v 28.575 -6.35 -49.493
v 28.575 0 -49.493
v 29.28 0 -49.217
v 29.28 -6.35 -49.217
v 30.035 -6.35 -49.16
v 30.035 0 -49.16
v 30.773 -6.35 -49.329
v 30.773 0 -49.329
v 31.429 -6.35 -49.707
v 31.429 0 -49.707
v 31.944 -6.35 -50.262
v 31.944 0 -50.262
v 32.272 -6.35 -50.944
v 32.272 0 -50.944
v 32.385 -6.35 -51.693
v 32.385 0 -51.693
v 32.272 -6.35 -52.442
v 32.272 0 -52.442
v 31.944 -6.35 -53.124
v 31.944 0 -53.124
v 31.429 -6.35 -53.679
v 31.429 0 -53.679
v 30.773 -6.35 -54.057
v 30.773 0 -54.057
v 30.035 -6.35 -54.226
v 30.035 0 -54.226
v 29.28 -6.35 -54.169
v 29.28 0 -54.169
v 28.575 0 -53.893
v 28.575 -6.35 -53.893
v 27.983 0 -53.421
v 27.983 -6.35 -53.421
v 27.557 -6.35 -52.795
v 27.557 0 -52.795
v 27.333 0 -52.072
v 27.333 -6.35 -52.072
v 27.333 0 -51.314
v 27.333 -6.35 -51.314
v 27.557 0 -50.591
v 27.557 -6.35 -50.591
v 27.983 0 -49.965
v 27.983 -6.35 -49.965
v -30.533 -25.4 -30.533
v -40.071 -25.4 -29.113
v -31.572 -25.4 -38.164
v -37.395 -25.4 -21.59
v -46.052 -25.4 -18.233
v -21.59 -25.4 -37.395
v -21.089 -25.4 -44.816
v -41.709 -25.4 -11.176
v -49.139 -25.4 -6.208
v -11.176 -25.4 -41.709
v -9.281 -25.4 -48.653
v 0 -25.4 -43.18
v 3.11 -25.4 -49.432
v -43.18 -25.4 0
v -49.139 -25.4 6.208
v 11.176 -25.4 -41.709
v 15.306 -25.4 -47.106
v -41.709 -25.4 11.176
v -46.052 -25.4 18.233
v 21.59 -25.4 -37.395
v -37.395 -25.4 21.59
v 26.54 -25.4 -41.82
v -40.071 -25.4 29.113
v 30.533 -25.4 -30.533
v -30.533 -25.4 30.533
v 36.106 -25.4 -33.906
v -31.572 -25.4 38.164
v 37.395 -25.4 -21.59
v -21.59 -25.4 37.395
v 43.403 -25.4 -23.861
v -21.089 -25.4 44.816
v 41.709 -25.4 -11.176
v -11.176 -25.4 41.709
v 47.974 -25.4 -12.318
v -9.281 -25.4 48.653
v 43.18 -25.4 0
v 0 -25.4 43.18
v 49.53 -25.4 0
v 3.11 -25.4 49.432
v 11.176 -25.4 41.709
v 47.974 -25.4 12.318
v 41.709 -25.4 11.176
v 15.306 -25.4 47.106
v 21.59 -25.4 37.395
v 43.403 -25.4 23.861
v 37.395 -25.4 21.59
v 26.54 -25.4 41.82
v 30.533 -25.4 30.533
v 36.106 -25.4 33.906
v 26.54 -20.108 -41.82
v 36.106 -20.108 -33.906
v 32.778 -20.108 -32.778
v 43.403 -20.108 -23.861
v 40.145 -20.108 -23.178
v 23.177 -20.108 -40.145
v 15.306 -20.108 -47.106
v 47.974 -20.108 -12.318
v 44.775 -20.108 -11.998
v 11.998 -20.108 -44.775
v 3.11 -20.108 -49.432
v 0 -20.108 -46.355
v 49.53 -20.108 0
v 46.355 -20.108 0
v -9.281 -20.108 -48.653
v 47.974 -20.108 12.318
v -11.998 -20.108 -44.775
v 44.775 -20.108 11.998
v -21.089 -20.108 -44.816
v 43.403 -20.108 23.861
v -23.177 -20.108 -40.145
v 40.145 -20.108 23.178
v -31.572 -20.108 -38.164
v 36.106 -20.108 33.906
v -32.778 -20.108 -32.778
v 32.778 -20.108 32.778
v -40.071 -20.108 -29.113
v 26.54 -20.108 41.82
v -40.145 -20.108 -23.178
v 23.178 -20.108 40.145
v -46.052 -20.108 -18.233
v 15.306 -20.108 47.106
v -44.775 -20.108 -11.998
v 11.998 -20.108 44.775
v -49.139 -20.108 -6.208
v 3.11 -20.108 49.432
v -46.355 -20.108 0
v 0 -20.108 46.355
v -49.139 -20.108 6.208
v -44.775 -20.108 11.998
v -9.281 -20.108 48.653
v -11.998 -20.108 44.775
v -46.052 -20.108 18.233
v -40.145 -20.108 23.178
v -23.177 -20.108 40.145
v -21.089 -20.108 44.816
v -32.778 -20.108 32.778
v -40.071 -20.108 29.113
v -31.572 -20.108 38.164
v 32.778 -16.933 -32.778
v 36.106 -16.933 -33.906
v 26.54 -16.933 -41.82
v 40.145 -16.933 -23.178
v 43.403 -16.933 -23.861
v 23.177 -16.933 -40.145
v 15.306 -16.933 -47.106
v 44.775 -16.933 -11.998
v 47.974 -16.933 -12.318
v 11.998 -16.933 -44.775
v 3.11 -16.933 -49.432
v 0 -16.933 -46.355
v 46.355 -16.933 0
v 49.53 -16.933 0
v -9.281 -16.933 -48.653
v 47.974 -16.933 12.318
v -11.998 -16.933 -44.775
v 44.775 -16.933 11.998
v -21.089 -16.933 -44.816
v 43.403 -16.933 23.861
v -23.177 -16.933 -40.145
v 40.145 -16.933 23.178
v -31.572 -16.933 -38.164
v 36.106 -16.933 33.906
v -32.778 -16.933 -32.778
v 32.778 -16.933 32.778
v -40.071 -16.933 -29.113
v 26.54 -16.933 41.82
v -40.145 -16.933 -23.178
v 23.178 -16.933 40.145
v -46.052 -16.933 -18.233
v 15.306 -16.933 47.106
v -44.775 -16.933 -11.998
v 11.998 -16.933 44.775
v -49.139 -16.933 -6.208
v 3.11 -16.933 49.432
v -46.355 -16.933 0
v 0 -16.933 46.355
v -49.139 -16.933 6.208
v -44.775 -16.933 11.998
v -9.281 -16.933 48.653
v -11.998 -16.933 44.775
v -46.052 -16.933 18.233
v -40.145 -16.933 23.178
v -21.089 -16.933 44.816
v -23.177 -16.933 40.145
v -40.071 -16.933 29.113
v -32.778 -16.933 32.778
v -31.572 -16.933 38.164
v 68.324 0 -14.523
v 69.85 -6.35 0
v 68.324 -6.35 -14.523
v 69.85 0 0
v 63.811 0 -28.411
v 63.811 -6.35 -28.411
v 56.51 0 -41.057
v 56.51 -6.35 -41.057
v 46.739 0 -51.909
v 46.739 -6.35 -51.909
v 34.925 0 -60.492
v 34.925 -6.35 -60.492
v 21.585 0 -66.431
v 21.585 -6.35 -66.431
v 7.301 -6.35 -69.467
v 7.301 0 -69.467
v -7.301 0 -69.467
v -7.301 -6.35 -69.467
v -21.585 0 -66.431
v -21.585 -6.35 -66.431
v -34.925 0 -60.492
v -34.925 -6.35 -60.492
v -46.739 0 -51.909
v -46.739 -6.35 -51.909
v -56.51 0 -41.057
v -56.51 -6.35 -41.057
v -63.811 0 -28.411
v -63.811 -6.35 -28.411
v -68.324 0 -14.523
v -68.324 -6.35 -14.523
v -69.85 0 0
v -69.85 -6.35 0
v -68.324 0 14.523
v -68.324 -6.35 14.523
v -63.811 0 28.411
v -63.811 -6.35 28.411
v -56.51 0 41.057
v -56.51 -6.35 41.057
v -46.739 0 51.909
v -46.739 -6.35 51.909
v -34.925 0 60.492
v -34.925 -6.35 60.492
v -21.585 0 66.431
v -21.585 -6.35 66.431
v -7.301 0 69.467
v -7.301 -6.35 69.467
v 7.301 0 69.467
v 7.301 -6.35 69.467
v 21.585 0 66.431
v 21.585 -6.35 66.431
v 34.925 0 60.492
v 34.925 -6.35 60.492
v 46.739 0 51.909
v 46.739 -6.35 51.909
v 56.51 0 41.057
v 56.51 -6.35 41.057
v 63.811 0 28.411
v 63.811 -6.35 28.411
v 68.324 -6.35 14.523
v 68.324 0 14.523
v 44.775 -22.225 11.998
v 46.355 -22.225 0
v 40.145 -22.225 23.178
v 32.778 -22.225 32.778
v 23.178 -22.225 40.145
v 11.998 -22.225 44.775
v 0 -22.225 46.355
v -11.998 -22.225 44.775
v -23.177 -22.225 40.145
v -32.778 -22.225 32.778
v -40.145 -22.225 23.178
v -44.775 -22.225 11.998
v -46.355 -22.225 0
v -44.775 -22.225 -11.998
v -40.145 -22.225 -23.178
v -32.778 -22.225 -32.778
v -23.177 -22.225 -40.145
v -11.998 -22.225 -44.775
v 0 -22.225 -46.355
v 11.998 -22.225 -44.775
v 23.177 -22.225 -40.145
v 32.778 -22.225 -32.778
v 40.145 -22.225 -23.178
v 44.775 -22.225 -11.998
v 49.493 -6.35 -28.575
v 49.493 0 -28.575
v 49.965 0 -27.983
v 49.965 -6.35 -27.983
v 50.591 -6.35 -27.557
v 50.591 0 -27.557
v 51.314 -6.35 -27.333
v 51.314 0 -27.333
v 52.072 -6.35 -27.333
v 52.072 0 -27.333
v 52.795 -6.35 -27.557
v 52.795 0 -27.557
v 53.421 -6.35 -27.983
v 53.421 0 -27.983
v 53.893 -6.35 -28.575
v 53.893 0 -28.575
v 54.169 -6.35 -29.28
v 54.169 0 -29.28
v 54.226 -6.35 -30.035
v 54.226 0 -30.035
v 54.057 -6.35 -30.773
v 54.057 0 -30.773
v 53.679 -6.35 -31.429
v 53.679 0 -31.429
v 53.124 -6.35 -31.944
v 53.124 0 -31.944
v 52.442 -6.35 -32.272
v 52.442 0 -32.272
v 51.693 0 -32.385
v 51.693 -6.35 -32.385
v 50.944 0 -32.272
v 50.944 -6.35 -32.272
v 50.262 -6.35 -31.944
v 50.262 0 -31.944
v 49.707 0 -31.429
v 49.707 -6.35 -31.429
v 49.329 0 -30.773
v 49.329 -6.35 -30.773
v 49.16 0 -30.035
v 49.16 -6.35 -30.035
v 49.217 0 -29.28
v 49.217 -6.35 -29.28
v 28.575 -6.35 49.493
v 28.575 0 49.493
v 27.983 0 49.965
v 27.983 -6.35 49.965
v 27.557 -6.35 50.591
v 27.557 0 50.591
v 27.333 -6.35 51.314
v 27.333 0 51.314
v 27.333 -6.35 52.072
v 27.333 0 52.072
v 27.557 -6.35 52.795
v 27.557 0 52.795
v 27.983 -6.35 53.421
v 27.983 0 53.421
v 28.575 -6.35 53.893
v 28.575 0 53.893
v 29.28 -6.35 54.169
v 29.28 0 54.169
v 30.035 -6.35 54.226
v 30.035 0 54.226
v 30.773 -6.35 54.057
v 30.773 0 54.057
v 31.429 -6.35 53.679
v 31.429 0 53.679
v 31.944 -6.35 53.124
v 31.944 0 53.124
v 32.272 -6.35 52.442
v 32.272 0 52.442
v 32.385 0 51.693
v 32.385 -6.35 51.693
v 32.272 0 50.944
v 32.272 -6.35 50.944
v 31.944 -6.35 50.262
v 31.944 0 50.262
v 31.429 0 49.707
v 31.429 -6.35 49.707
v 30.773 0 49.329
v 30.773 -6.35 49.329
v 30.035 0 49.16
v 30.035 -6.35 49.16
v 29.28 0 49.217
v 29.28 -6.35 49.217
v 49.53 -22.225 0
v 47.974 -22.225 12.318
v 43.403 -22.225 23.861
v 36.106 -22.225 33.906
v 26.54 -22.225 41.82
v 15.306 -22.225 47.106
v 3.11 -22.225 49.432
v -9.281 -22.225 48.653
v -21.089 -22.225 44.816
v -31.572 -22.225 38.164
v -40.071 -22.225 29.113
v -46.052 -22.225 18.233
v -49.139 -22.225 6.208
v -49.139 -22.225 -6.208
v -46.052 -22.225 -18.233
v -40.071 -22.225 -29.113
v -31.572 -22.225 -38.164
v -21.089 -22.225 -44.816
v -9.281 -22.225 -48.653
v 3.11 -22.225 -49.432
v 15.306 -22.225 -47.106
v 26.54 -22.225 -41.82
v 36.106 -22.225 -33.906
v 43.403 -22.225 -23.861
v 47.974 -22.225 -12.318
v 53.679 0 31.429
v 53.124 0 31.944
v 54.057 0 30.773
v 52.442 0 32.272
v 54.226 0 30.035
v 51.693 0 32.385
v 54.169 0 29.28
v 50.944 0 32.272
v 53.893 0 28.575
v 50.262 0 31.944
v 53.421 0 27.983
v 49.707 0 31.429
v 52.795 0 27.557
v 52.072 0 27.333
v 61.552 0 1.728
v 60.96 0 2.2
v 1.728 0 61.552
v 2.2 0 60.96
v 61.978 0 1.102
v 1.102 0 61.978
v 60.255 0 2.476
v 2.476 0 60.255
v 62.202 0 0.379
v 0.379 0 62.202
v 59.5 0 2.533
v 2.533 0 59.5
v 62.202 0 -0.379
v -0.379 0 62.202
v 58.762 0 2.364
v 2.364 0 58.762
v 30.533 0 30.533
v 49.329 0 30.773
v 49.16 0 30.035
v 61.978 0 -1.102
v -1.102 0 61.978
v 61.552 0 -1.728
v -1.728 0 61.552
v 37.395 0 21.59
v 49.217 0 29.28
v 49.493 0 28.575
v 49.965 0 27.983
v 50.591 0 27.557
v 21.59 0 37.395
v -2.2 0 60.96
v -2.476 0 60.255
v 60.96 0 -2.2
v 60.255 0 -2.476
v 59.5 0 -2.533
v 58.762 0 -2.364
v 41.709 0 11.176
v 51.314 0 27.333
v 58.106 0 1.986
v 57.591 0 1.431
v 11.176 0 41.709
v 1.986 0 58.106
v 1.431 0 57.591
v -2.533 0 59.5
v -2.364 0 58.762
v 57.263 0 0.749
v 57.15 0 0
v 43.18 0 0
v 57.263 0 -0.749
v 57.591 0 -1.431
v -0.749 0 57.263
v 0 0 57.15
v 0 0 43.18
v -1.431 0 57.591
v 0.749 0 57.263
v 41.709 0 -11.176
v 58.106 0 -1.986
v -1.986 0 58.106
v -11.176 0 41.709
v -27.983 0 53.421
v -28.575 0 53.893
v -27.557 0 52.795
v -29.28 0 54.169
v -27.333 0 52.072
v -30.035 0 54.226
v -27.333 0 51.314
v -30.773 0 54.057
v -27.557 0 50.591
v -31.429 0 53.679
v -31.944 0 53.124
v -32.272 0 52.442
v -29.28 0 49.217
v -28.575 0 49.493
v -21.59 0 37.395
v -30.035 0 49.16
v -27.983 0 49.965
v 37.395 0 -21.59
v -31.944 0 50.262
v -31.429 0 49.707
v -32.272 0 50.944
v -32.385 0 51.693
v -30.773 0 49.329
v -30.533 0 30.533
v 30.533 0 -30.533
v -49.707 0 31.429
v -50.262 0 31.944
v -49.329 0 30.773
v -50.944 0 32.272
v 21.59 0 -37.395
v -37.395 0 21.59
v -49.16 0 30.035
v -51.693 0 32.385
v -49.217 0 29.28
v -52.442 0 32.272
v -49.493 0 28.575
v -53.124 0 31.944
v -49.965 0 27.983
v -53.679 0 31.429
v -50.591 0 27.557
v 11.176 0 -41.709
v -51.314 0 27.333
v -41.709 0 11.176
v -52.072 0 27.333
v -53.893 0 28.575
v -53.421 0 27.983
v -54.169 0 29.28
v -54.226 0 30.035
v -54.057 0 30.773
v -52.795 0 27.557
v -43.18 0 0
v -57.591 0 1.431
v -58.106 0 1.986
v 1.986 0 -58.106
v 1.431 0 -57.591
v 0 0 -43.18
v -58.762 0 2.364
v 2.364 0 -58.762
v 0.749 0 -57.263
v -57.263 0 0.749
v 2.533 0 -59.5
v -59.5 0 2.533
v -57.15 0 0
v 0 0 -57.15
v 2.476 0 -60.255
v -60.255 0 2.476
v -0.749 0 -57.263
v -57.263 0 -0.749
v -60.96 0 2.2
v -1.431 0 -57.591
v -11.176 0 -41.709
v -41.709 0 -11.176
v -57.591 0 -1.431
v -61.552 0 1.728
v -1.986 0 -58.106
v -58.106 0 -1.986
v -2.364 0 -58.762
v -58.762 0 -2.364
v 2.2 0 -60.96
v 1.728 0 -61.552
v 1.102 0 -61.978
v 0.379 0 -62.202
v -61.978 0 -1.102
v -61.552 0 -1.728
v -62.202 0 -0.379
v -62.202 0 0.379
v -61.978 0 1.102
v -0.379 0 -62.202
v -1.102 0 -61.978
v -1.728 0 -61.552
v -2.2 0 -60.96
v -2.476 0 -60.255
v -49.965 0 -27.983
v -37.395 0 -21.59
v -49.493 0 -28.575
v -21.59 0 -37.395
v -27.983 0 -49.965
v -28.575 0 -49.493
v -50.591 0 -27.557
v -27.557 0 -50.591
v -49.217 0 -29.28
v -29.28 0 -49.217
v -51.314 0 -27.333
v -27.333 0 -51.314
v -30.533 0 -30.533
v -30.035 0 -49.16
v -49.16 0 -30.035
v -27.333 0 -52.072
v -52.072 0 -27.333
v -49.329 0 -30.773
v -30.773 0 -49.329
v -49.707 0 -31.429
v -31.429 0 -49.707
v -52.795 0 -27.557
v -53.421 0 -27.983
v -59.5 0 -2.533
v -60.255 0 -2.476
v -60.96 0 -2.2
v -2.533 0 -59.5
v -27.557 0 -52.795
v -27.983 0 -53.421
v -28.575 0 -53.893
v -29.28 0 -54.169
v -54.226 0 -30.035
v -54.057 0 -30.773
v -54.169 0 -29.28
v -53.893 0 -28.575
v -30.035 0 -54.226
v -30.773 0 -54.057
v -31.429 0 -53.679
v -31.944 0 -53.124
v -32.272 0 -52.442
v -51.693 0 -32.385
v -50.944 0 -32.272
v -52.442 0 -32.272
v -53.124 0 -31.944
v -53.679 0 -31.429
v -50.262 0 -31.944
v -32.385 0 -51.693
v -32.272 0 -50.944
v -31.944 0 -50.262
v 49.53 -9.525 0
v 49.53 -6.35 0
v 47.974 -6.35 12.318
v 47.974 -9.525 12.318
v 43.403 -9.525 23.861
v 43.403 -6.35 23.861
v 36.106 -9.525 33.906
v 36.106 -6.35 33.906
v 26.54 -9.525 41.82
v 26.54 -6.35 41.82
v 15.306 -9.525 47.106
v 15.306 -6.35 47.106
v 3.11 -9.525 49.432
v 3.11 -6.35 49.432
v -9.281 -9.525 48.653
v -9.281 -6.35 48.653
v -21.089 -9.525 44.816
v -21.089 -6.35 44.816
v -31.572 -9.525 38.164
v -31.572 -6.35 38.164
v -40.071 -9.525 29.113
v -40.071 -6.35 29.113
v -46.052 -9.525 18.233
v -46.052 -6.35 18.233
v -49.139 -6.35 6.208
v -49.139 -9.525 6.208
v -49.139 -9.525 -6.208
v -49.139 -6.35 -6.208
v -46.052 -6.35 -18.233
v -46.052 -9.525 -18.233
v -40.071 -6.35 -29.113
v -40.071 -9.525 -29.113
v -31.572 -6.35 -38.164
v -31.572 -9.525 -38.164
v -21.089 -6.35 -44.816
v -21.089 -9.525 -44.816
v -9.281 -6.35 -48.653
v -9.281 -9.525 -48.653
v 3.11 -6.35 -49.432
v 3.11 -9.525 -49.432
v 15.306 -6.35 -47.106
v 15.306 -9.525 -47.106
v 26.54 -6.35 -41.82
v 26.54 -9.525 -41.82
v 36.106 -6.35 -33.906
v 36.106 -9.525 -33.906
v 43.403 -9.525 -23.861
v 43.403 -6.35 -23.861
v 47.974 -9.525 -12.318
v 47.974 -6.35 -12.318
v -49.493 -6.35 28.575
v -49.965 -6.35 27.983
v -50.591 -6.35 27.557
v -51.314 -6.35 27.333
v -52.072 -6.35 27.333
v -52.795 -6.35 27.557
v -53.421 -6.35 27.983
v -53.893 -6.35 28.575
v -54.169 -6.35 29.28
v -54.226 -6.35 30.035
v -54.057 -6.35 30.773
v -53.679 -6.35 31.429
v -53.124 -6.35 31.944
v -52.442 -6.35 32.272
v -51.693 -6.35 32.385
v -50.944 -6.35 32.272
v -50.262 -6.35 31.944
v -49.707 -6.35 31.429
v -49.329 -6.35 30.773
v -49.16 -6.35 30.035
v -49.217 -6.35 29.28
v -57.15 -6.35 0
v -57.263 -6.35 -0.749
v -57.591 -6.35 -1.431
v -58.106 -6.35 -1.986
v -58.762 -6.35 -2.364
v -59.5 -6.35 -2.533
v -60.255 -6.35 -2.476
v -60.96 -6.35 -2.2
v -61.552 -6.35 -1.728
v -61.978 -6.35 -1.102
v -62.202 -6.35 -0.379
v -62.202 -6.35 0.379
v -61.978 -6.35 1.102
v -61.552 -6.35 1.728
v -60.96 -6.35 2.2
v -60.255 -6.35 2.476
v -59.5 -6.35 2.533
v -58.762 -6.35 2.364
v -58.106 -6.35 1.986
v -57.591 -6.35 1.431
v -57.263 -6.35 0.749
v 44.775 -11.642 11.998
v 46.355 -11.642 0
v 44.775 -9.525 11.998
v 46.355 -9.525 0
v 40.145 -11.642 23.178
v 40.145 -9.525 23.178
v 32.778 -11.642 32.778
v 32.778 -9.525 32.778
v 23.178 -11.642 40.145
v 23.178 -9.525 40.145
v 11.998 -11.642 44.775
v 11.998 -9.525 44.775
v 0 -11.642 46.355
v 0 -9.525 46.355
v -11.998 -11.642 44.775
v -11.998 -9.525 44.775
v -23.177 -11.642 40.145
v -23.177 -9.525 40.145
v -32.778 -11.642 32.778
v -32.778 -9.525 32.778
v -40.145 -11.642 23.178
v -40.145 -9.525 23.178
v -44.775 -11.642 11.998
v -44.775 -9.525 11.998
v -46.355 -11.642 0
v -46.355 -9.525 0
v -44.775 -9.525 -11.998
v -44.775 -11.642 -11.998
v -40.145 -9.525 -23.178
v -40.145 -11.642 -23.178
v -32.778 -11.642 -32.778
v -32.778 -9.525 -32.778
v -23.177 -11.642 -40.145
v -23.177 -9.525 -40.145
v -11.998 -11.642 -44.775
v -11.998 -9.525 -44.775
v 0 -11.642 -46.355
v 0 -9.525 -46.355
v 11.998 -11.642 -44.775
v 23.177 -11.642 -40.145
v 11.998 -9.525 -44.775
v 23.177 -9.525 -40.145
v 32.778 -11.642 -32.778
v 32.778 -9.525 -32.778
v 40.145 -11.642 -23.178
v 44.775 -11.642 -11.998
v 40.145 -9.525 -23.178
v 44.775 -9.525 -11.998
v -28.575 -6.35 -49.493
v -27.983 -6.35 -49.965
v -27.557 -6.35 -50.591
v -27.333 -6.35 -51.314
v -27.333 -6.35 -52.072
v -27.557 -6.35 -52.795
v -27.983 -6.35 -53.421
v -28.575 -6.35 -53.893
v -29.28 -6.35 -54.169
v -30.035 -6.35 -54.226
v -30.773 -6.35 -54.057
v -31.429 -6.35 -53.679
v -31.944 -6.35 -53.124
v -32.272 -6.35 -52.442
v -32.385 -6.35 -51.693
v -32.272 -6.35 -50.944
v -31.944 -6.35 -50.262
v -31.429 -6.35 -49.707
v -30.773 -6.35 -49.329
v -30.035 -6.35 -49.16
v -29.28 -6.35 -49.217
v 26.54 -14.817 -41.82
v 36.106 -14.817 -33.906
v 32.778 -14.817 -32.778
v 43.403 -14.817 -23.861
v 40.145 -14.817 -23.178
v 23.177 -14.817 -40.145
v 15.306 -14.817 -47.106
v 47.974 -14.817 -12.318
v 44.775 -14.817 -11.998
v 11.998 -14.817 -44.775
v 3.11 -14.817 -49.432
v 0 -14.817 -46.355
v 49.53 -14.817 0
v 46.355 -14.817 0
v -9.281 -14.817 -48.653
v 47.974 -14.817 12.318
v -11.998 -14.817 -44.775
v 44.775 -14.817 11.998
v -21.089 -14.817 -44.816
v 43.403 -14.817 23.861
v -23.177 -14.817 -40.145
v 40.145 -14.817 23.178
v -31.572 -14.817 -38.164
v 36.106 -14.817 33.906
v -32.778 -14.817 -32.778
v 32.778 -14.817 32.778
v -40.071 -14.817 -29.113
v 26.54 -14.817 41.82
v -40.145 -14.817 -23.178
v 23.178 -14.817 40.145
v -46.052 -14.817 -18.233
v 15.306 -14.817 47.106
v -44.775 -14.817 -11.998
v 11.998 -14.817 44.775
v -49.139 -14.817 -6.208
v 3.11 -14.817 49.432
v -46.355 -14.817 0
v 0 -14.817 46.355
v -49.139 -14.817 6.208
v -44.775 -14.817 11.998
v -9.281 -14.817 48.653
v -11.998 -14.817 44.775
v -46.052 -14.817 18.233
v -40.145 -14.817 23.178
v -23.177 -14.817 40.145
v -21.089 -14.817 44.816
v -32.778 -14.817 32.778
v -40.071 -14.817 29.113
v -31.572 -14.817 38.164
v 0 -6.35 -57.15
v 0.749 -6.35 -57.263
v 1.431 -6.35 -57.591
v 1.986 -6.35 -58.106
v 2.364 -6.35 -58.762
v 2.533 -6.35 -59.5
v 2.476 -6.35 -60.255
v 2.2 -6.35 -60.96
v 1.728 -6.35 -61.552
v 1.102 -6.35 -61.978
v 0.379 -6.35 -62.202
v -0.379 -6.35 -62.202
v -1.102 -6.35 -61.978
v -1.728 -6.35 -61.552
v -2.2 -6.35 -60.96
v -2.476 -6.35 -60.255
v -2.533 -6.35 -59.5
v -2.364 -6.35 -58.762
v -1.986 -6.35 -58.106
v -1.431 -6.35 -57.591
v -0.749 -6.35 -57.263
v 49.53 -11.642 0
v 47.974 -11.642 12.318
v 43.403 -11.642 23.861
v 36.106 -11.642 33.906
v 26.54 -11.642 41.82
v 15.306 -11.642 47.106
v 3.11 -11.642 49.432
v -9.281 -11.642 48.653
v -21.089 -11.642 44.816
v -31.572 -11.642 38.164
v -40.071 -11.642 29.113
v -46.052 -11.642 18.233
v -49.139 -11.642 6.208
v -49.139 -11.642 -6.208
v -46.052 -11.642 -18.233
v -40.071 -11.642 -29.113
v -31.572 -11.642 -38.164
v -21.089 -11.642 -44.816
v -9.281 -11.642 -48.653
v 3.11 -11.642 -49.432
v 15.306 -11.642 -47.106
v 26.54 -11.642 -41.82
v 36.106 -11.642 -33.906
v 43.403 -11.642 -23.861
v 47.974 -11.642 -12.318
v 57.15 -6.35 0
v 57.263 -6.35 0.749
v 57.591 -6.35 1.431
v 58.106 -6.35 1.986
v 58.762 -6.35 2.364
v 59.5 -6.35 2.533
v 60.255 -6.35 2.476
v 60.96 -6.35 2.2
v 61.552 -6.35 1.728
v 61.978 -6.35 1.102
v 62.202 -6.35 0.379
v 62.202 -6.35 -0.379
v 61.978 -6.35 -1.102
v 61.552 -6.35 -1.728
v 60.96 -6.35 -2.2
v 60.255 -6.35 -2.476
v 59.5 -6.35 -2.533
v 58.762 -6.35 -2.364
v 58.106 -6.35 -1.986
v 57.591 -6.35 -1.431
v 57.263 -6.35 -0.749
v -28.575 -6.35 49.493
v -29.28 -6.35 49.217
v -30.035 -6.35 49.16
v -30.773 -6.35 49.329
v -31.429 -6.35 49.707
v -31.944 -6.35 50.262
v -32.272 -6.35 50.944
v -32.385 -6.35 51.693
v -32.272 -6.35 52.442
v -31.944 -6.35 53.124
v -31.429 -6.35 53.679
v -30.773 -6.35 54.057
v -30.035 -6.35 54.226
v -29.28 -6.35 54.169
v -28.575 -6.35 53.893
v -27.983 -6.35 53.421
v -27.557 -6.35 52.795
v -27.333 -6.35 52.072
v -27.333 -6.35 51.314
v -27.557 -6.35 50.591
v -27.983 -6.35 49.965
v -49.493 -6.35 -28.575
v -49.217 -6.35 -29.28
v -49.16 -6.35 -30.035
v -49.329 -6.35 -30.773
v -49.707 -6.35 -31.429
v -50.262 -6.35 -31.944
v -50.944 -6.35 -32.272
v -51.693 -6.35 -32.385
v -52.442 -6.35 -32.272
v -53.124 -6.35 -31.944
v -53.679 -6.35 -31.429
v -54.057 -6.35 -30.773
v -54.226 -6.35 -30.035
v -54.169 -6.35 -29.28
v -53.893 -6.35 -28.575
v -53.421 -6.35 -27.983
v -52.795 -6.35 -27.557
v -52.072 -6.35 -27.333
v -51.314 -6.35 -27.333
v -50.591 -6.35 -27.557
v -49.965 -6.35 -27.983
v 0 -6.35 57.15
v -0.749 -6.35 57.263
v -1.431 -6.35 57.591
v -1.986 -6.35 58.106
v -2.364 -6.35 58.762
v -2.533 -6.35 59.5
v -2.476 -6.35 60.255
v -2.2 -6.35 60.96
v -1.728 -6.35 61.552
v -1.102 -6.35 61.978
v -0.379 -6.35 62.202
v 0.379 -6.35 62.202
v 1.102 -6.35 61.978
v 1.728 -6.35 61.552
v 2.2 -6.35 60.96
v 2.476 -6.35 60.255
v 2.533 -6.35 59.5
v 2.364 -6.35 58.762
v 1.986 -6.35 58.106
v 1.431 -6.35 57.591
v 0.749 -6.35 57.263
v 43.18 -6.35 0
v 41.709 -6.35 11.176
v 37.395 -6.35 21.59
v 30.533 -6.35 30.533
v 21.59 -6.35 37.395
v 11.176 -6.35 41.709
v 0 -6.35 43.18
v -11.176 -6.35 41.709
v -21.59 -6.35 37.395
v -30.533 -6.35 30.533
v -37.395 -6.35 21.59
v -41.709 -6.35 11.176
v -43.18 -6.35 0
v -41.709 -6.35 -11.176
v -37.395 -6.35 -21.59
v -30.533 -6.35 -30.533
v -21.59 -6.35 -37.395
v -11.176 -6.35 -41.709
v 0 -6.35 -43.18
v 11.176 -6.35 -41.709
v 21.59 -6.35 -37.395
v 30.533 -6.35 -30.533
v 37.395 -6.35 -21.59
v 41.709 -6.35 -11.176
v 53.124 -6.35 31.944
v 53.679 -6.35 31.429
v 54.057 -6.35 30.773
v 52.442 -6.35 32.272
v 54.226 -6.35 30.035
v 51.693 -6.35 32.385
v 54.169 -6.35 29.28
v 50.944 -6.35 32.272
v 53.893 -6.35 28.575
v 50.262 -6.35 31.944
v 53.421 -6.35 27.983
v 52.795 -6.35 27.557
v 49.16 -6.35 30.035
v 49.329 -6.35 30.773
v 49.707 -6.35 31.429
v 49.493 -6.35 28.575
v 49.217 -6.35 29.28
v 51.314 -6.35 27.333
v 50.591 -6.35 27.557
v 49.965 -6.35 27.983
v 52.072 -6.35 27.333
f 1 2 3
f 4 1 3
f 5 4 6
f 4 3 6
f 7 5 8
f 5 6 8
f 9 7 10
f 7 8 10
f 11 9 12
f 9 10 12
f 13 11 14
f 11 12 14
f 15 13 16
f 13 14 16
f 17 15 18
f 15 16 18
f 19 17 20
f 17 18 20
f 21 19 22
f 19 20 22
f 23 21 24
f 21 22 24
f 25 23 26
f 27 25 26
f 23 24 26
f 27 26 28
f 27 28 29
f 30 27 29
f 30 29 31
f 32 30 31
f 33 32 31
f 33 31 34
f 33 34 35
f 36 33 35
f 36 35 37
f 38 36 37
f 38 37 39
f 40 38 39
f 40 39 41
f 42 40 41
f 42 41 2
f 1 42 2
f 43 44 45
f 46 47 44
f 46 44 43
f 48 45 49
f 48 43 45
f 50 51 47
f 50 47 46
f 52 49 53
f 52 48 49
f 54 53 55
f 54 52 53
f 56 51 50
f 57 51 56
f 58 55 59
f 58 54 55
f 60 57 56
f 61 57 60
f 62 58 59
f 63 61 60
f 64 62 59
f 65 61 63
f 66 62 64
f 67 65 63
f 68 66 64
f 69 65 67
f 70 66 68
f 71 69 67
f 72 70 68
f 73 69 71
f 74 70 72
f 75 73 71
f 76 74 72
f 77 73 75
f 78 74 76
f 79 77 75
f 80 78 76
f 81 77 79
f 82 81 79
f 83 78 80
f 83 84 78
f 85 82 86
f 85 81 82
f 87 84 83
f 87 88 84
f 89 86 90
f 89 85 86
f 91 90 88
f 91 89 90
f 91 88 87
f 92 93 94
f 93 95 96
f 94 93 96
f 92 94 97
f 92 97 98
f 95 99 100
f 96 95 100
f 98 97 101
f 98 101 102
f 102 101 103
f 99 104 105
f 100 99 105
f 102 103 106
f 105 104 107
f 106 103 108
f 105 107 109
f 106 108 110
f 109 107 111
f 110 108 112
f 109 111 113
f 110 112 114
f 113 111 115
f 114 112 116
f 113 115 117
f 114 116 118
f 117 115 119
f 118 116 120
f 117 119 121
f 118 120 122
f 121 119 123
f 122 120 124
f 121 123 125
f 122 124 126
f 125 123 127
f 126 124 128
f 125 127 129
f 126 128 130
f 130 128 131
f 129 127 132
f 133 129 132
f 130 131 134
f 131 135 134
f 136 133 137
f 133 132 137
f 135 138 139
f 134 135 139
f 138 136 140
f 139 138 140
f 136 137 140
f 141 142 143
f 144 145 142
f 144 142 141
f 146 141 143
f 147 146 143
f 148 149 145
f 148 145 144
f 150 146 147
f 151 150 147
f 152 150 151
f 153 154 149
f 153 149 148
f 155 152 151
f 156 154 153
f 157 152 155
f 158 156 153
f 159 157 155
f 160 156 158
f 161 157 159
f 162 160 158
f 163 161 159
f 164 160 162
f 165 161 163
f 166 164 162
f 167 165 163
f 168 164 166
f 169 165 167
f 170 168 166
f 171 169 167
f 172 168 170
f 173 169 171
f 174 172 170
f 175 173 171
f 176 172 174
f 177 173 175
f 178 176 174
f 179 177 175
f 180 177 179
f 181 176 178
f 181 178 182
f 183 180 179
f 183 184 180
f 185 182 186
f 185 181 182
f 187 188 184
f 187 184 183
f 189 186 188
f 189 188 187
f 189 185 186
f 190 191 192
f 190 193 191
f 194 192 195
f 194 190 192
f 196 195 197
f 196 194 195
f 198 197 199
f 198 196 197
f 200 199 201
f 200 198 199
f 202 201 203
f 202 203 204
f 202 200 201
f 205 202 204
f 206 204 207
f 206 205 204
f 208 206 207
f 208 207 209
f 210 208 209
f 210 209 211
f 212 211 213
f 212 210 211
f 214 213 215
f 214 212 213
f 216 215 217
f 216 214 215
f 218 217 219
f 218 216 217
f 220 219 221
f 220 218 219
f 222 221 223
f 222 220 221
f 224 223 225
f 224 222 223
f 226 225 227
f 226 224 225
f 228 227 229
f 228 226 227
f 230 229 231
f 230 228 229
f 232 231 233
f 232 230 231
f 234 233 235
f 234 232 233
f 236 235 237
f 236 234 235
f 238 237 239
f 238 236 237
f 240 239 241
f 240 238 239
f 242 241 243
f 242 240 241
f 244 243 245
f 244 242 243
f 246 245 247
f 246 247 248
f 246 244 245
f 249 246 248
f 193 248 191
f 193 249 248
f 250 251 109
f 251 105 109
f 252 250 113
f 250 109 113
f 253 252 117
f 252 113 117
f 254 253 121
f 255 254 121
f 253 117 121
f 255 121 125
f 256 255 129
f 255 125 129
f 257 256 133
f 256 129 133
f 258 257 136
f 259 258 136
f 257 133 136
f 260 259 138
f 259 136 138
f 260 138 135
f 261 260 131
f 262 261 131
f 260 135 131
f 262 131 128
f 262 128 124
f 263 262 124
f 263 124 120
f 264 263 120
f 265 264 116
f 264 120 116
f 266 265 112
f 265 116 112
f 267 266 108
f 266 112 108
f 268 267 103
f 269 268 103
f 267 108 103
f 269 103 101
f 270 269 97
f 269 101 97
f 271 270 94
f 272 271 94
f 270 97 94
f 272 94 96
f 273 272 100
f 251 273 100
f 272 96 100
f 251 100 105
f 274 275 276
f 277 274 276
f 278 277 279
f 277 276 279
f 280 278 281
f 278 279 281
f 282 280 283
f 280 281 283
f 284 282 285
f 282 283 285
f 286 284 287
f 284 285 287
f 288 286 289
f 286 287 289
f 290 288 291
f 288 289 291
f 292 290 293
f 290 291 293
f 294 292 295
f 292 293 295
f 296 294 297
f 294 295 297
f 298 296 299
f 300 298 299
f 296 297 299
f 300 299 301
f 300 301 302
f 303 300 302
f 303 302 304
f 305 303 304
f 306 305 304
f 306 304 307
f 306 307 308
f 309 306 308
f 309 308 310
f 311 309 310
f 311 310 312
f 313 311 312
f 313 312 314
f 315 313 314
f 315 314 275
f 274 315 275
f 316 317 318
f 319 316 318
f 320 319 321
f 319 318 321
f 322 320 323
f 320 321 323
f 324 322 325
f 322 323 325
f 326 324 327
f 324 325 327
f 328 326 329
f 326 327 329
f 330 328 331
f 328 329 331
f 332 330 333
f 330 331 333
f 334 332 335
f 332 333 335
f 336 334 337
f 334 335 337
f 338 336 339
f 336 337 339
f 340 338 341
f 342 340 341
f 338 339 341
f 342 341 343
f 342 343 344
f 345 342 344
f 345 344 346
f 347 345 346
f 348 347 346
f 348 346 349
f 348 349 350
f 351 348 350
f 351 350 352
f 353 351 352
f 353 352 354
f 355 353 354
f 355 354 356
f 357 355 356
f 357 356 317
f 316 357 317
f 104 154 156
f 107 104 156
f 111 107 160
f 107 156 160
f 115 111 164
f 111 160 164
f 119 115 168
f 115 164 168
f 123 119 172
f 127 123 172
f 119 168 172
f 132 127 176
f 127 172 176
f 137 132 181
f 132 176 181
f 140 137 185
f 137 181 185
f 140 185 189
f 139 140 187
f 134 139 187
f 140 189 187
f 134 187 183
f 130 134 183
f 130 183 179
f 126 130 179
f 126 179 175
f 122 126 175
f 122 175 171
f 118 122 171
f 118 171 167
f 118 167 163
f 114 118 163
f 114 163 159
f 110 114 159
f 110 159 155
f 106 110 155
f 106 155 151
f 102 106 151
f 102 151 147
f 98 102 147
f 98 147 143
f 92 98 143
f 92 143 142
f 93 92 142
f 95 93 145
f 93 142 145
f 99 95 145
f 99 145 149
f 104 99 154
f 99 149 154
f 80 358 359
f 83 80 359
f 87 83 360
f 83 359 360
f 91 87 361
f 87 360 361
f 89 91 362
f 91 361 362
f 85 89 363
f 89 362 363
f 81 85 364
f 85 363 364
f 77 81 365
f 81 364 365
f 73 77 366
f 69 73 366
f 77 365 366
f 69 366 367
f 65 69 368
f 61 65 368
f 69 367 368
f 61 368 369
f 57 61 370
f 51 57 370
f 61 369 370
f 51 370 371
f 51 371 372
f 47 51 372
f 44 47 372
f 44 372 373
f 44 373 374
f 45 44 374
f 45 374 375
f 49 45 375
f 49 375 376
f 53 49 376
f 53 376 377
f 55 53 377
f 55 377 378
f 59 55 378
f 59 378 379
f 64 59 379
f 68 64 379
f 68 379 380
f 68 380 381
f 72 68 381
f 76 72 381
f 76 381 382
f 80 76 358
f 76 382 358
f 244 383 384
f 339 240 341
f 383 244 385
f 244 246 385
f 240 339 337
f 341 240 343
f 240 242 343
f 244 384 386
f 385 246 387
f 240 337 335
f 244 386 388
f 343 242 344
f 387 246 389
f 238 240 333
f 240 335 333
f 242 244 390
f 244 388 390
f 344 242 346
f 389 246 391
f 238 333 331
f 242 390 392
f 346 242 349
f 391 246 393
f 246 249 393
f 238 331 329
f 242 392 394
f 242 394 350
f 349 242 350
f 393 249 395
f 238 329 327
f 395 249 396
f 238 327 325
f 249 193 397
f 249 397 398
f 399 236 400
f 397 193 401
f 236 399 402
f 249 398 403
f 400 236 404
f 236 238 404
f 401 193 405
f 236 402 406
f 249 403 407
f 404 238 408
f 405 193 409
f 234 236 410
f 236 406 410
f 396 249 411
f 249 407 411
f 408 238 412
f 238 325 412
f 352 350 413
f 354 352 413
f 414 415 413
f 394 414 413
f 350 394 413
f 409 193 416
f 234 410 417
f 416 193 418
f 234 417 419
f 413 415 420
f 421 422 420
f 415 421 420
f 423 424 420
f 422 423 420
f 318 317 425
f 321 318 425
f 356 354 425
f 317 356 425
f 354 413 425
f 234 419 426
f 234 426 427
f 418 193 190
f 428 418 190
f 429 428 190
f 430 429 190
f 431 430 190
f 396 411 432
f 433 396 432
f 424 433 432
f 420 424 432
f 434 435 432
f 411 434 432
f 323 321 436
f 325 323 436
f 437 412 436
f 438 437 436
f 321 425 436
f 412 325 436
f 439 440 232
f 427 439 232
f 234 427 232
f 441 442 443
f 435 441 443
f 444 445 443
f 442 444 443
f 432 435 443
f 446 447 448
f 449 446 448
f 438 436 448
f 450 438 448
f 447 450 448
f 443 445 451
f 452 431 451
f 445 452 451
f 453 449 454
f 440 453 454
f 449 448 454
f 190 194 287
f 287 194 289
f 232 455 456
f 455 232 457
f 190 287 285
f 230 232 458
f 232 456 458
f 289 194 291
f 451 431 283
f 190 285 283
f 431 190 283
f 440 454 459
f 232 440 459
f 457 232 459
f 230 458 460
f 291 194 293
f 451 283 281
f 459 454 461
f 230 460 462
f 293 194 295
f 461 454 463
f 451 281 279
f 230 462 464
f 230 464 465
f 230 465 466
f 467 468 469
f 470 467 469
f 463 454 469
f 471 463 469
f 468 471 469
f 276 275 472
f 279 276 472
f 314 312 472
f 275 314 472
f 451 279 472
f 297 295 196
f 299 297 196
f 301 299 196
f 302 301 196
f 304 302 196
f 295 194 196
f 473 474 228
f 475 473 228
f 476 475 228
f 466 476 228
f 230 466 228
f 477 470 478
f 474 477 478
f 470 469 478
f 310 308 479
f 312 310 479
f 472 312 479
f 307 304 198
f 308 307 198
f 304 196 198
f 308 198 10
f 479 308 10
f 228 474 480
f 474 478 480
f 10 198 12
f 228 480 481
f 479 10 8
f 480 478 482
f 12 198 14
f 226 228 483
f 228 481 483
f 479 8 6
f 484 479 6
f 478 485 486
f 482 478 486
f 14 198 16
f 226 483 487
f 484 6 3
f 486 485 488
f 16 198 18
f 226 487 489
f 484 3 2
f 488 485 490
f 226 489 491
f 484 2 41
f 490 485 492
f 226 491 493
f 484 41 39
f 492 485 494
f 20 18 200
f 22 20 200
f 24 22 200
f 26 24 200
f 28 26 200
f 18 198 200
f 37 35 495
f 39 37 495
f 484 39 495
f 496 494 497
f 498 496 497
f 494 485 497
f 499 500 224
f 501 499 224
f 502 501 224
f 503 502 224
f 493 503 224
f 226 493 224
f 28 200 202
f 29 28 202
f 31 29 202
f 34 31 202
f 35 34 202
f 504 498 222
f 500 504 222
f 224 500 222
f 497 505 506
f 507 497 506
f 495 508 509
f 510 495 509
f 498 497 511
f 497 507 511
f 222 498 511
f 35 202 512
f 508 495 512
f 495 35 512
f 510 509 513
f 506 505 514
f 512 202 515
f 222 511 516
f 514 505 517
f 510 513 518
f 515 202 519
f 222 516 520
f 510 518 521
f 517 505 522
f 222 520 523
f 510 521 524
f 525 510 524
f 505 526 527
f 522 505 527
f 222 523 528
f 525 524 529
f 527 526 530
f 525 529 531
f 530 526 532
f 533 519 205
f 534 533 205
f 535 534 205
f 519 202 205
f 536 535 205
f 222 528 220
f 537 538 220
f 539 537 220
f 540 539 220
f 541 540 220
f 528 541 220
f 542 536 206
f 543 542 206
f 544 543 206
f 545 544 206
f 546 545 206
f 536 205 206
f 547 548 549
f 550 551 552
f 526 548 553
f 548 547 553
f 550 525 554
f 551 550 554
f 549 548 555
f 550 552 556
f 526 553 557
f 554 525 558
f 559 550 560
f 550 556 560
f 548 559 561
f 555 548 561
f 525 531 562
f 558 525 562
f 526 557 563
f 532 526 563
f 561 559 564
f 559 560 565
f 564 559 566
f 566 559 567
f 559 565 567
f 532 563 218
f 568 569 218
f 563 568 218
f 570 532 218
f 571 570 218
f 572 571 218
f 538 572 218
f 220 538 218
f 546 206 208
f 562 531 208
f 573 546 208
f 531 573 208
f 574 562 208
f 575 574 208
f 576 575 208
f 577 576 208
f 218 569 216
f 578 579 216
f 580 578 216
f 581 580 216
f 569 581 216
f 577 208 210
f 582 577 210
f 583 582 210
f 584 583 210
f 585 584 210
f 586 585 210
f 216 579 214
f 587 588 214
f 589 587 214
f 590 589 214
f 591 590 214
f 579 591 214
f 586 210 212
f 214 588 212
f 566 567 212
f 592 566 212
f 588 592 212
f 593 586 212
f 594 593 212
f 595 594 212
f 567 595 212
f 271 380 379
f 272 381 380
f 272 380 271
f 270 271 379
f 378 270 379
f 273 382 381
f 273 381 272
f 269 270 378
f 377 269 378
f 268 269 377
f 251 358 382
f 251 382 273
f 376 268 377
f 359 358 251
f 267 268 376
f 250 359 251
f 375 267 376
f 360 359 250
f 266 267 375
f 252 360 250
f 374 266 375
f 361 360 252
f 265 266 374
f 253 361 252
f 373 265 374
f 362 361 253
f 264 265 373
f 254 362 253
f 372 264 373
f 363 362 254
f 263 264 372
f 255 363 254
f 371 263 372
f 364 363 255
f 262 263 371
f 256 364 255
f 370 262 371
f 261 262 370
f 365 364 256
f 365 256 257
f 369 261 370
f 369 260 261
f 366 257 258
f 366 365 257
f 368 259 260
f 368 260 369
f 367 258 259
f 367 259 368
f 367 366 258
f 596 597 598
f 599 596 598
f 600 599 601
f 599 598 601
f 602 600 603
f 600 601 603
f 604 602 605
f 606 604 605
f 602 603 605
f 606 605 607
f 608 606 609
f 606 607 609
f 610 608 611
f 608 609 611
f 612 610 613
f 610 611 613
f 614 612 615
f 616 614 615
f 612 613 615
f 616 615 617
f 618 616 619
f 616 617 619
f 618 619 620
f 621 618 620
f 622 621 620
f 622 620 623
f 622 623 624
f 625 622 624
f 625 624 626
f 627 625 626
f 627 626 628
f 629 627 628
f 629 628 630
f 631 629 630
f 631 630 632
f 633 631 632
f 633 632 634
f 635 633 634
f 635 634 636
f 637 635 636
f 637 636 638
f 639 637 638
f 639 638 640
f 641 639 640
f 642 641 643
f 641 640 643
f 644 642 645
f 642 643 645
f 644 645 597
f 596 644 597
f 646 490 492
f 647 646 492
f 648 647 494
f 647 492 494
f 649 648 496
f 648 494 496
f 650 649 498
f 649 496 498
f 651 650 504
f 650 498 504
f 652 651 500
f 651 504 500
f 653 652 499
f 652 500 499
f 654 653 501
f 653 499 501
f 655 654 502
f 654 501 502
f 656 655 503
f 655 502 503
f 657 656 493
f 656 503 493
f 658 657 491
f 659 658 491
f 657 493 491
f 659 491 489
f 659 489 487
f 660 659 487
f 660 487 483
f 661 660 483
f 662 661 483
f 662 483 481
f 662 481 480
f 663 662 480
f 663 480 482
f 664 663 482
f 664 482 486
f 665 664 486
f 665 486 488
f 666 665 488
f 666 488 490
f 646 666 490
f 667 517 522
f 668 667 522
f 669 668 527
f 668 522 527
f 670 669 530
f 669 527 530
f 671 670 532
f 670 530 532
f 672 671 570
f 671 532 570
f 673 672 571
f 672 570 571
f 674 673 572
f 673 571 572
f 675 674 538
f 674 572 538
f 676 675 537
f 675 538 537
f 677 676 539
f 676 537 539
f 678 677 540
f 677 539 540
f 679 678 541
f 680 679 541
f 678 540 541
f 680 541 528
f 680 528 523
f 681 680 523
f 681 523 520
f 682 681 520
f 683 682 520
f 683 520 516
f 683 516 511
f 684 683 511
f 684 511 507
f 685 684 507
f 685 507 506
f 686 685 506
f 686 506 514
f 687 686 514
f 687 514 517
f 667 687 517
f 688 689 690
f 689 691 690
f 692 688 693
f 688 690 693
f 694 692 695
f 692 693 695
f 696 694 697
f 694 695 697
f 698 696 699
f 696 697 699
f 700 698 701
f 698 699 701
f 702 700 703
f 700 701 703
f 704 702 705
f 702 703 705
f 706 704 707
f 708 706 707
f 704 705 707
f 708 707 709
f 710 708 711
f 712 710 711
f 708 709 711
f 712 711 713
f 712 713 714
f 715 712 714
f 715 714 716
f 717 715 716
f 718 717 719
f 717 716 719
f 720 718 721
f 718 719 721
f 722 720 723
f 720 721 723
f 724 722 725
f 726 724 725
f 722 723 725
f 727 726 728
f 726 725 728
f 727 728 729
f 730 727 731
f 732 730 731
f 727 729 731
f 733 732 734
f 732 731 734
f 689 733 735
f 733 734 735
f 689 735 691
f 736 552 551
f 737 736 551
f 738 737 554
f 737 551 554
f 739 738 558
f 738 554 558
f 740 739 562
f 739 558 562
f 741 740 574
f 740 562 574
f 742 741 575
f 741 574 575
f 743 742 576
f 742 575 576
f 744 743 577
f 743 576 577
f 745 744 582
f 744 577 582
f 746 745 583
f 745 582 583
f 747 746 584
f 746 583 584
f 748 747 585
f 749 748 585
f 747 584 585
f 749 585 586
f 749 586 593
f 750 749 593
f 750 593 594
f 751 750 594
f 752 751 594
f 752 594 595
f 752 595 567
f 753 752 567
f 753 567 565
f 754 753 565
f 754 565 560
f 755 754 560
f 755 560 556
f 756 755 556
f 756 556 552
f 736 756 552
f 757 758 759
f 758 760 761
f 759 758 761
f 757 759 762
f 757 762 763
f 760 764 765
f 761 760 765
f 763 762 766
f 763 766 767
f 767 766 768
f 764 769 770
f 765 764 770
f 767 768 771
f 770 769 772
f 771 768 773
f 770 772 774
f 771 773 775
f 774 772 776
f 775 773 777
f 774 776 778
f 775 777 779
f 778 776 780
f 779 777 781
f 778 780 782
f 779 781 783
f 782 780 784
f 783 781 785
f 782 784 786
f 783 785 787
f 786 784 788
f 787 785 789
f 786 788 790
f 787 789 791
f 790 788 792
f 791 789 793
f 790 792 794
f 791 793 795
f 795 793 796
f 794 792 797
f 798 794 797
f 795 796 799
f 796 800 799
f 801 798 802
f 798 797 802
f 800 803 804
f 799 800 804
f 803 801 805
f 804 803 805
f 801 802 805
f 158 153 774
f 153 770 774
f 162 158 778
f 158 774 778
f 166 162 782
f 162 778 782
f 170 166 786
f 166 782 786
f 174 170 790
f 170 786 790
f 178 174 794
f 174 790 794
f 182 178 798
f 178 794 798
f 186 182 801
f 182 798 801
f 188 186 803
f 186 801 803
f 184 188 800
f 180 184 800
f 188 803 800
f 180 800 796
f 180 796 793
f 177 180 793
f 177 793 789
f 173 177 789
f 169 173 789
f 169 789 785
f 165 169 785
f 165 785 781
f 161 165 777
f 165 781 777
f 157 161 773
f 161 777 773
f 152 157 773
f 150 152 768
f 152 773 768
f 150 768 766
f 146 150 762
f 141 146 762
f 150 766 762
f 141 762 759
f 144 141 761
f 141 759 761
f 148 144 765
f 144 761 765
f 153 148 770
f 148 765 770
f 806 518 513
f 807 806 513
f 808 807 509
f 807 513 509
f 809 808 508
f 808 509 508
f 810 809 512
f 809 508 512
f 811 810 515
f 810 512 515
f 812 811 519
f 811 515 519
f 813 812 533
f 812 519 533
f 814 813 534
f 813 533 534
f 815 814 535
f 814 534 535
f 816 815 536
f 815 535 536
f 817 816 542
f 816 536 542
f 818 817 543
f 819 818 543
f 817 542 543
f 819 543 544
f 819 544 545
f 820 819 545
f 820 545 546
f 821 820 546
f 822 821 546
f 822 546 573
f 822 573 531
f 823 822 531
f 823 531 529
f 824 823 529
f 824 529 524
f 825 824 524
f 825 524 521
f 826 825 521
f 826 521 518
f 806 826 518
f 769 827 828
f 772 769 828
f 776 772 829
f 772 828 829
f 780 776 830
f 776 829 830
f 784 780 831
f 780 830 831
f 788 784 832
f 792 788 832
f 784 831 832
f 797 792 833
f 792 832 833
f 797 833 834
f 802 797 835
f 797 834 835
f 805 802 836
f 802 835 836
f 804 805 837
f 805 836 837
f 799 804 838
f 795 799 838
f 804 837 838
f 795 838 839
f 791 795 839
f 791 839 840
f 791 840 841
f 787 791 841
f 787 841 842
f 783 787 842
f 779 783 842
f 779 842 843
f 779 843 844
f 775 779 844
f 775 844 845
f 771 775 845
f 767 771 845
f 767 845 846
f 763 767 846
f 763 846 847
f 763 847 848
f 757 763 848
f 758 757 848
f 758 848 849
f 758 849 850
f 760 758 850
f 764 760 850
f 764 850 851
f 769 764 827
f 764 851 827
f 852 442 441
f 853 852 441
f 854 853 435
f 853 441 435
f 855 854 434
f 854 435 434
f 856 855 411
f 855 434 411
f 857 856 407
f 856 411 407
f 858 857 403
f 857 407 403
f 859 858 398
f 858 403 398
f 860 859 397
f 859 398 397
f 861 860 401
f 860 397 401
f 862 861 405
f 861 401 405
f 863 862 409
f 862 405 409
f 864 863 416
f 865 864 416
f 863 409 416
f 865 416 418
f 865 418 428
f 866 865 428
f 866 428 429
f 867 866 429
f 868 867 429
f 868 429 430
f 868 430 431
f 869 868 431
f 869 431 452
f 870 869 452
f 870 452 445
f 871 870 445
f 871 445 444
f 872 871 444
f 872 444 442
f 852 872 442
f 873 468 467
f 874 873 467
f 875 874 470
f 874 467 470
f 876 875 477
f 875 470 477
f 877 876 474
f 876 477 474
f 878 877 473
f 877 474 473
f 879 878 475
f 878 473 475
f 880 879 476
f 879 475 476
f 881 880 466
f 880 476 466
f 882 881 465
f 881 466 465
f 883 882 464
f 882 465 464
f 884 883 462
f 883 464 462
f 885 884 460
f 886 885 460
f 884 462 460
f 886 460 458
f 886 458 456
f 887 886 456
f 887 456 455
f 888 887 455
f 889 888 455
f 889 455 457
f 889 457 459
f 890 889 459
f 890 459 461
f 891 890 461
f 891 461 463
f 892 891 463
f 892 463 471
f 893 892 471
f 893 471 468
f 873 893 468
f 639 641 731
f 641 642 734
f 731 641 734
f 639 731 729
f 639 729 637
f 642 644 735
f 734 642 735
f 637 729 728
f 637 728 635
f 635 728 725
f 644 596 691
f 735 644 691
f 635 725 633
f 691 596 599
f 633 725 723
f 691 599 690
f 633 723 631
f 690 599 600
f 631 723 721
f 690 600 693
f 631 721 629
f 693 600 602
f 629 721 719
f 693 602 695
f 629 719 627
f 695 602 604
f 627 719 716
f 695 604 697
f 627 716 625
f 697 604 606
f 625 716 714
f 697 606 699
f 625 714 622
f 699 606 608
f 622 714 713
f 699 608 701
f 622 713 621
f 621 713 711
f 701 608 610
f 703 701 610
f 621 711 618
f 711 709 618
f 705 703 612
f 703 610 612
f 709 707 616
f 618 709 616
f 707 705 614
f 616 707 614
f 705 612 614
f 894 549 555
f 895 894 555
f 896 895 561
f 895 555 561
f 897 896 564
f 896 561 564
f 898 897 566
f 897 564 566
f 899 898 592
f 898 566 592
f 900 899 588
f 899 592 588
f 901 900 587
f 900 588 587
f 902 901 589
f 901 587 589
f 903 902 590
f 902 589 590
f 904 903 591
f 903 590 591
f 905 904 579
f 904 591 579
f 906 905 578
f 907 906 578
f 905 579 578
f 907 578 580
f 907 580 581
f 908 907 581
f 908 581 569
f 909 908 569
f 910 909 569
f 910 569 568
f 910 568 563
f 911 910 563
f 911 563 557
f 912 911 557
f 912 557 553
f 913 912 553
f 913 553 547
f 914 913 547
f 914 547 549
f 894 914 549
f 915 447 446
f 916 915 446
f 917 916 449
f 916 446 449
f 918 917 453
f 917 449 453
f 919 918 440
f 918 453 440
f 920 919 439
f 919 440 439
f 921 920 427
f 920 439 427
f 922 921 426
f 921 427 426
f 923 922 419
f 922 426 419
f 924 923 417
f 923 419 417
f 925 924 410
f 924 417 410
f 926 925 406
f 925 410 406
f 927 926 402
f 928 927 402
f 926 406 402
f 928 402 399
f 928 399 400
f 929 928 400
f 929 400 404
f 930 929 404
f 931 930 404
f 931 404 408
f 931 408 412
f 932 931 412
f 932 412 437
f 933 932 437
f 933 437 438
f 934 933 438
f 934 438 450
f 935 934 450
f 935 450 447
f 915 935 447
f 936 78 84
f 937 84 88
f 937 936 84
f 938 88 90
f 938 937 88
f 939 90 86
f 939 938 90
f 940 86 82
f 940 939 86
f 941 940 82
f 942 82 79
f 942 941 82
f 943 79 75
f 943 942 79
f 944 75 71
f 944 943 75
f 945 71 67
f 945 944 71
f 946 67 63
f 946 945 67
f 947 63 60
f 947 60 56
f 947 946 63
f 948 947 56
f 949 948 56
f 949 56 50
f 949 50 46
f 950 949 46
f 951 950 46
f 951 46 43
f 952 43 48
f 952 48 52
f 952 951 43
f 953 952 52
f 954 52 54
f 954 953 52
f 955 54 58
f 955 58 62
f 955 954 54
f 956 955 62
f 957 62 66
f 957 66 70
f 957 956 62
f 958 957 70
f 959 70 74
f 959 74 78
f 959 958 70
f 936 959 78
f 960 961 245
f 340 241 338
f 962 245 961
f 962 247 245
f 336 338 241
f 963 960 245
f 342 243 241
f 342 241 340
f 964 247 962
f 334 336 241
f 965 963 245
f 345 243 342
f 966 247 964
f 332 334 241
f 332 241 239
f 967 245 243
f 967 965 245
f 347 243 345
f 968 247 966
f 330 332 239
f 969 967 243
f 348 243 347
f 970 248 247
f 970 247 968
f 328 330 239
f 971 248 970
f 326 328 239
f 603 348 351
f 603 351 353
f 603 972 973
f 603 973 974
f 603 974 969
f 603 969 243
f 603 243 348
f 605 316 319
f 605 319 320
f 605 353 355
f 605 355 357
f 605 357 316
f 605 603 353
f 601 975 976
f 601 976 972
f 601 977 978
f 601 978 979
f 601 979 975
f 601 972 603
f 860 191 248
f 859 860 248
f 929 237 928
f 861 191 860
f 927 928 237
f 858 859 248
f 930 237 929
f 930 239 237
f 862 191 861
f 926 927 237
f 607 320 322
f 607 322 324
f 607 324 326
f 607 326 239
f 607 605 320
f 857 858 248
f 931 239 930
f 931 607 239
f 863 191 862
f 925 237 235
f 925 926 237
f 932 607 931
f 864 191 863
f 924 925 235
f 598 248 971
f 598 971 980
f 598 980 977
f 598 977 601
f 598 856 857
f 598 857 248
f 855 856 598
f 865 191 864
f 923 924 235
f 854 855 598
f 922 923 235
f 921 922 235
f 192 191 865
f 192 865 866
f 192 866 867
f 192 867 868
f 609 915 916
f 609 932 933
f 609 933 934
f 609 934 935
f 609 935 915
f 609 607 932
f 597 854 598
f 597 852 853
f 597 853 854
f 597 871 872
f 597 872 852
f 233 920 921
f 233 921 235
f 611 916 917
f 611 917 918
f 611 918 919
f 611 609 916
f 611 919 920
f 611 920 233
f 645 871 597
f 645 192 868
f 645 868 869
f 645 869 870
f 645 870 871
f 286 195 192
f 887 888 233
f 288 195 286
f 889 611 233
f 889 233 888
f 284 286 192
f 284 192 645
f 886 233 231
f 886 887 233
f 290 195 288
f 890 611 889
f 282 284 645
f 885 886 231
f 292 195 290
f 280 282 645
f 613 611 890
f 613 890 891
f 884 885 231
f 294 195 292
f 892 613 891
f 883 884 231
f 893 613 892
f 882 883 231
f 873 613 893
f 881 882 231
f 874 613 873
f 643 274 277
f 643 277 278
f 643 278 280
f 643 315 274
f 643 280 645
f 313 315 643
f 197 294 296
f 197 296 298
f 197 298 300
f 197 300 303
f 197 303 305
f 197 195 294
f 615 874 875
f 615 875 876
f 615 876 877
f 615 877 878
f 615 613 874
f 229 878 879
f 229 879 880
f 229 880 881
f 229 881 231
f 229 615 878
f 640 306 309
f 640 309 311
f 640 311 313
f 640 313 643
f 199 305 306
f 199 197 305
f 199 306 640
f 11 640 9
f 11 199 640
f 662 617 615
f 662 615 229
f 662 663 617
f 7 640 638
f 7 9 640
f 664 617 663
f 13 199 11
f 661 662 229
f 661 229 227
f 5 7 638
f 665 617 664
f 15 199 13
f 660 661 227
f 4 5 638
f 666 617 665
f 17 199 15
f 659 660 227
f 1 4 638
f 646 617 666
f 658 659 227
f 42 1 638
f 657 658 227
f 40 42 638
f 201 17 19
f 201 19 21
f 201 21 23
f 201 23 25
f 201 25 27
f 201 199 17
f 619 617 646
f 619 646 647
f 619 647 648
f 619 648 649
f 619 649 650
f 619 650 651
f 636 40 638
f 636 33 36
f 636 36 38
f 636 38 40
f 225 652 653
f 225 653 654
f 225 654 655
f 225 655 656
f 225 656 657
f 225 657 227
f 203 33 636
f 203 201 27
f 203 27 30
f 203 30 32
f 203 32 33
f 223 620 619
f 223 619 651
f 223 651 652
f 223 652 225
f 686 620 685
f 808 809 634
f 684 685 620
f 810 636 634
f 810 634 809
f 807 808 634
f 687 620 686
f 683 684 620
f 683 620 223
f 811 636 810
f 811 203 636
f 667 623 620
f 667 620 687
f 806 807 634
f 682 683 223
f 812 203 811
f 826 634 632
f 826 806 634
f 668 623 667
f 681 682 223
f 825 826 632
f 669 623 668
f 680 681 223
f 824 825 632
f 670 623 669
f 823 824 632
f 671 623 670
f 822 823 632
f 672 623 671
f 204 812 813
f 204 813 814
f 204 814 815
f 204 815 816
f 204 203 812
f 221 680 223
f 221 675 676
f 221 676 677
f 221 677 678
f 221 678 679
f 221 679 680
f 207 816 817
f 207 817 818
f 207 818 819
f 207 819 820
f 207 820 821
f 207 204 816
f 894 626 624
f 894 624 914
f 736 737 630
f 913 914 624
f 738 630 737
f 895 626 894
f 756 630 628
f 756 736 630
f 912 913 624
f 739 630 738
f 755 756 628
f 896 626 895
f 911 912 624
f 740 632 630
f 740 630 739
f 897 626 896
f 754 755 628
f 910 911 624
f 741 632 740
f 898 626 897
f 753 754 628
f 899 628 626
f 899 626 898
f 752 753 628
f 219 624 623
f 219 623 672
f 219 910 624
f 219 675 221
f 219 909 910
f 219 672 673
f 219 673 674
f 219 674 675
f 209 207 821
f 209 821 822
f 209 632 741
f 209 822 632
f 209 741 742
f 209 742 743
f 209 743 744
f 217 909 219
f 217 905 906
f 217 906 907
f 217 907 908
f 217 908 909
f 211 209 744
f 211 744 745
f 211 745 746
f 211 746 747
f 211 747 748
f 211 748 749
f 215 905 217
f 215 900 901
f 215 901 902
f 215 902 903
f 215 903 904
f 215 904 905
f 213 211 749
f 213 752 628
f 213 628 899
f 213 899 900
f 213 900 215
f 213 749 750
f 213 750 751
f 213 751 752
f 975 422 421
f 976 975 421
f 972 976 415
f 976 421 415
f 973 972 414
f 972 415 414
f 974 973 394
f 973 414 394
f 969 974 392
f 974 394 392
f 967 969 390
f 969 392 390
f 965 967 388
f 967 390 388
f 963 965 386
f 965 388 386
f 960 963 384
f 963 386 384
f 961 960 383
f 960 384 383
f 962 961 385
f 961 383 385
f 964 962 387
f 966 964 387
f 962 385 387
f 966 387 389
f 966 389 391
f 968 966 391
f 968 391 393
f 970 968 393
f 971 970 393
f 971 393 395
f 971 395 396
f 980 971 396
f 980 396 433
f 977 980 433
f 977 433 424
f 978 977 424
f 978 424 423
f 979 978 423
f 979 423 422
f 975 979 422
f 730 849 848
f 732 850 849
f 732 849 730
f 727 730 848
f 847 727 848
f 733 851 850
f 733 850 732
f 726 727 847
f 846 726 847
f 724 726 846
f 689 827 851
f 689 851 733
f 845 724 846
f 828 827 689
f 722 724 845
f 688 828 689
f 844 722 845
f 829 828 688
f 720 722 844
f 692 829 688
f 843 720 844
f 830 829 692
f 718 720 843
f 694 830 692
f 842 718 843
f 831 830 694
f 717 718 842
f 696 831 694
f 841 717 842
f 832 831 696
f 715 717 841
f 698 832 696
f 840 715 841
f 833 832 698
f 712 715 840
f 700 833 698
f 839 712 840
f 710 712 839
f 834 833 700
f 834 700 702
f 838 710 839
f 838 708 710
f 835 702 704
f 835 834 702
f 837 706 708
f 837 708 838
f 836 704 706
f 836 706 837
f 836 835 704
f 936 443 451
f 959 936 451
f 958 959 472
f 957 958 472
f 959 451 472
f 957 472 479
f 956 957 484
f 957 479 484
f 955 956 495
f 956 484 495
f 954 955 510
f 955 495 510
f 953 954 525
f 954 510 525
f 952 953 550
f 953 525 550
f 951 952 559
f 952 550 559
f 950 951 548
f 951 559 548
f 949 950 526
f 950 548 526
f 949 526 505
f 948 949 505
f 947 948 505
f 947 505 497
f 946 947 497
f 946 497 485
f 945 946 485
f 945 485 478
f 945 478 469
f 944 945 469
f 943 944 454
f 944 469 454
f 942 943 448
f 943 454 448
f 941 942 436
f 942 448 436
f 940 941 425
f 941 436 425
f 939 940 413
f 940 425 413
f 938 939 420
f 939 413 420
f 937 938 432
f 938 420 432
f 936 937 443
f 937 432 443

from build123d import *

# Parameters (mm, degrees)
SKETCH1_W           = 26.67
SKETCH1_H           = 6.35
SKETCH2_R           = 49.53
SKETCH2_R_2         = 43.18
BOSS_EXTRUDE1_DEPTH = 19.05
SKETCH3_W           = 3.175
SKETCH3_H           = 2.116666667
SKETCH3_H_2         = 2.116666666
SKETCH4_R           = 2.54
CUT_EXTRUDE1_DEPTH  = 26.4
CIRPATTERN1_COUNT   = 12


with BuildPart() as part:
    # Sketch1 → Revolve1 (revolve)
    with BuildSketch(Plane.XY):
        with Locations((56.515, -3.175)):
            Rectangle(SKETCH1_W, SKETCH1_H)
    revolve(axis=Axis((0, -127, 0), (0, 1, 0)))

    # Sketch2 → Boss-Extrude1 (add)
    with BuildSketch(Plane.XZ.offset(6.35)):
        Circle(SKETCH2_R)
        Circle(SKETCH2_R_2, mode=Mode.SUBTRACT)
    extrude(amount=BOSS_EXTRUDE1_DEPTH)

    # Sketch3 → Cut-Revolve1 (revolve, cut)
    with BuildSketch(Plane.XY):
        with Locations((47.9425, -21.166666666)):
            Rectangle(SKETCH3_W, SKETCH3_H)
        with Locations((47.9425, -15.875)):
            Rectangle(SKETCH3_W, SKETCH3_H_2)
        with Locations((47.9425, -10.583333334)):
            Rectangle(SKETCH3_W, SKETCH3_H)
    revolve(axis=Axis((0, 0, 0), (0, -1, 0)), mode=Mode.SUBTRACT)

    # Sketch4 → Cut-Extrude1 (cut, through all)
    with BuildSketch(Plane(origin=(0, 0, 0), x_dir=(1, 0, 0), z_dir=(0, 1, 0))):
        with Locations((-59.69, 0)):
            Circle(SKETCH4_R)
    cut_extrude1 = extrude(amount=-CUT_EXTRUDE1_DEPTH, mode=Mode.SUBTRACT)

    # CirPattern1: Cut-Extrude1 ×12 about axis
    cirpattern1_axis = Axis((0, 0, 0), (0, 1, 0))
    for i in range(1, CIRPATTERN1_COUNT):
        add(cut_extrude1.rotate(cirpattern1_axis, i * 360 / CIRPATTERN1_COUNT), mode=Mode.SUBTRACT)


solid = part.part
